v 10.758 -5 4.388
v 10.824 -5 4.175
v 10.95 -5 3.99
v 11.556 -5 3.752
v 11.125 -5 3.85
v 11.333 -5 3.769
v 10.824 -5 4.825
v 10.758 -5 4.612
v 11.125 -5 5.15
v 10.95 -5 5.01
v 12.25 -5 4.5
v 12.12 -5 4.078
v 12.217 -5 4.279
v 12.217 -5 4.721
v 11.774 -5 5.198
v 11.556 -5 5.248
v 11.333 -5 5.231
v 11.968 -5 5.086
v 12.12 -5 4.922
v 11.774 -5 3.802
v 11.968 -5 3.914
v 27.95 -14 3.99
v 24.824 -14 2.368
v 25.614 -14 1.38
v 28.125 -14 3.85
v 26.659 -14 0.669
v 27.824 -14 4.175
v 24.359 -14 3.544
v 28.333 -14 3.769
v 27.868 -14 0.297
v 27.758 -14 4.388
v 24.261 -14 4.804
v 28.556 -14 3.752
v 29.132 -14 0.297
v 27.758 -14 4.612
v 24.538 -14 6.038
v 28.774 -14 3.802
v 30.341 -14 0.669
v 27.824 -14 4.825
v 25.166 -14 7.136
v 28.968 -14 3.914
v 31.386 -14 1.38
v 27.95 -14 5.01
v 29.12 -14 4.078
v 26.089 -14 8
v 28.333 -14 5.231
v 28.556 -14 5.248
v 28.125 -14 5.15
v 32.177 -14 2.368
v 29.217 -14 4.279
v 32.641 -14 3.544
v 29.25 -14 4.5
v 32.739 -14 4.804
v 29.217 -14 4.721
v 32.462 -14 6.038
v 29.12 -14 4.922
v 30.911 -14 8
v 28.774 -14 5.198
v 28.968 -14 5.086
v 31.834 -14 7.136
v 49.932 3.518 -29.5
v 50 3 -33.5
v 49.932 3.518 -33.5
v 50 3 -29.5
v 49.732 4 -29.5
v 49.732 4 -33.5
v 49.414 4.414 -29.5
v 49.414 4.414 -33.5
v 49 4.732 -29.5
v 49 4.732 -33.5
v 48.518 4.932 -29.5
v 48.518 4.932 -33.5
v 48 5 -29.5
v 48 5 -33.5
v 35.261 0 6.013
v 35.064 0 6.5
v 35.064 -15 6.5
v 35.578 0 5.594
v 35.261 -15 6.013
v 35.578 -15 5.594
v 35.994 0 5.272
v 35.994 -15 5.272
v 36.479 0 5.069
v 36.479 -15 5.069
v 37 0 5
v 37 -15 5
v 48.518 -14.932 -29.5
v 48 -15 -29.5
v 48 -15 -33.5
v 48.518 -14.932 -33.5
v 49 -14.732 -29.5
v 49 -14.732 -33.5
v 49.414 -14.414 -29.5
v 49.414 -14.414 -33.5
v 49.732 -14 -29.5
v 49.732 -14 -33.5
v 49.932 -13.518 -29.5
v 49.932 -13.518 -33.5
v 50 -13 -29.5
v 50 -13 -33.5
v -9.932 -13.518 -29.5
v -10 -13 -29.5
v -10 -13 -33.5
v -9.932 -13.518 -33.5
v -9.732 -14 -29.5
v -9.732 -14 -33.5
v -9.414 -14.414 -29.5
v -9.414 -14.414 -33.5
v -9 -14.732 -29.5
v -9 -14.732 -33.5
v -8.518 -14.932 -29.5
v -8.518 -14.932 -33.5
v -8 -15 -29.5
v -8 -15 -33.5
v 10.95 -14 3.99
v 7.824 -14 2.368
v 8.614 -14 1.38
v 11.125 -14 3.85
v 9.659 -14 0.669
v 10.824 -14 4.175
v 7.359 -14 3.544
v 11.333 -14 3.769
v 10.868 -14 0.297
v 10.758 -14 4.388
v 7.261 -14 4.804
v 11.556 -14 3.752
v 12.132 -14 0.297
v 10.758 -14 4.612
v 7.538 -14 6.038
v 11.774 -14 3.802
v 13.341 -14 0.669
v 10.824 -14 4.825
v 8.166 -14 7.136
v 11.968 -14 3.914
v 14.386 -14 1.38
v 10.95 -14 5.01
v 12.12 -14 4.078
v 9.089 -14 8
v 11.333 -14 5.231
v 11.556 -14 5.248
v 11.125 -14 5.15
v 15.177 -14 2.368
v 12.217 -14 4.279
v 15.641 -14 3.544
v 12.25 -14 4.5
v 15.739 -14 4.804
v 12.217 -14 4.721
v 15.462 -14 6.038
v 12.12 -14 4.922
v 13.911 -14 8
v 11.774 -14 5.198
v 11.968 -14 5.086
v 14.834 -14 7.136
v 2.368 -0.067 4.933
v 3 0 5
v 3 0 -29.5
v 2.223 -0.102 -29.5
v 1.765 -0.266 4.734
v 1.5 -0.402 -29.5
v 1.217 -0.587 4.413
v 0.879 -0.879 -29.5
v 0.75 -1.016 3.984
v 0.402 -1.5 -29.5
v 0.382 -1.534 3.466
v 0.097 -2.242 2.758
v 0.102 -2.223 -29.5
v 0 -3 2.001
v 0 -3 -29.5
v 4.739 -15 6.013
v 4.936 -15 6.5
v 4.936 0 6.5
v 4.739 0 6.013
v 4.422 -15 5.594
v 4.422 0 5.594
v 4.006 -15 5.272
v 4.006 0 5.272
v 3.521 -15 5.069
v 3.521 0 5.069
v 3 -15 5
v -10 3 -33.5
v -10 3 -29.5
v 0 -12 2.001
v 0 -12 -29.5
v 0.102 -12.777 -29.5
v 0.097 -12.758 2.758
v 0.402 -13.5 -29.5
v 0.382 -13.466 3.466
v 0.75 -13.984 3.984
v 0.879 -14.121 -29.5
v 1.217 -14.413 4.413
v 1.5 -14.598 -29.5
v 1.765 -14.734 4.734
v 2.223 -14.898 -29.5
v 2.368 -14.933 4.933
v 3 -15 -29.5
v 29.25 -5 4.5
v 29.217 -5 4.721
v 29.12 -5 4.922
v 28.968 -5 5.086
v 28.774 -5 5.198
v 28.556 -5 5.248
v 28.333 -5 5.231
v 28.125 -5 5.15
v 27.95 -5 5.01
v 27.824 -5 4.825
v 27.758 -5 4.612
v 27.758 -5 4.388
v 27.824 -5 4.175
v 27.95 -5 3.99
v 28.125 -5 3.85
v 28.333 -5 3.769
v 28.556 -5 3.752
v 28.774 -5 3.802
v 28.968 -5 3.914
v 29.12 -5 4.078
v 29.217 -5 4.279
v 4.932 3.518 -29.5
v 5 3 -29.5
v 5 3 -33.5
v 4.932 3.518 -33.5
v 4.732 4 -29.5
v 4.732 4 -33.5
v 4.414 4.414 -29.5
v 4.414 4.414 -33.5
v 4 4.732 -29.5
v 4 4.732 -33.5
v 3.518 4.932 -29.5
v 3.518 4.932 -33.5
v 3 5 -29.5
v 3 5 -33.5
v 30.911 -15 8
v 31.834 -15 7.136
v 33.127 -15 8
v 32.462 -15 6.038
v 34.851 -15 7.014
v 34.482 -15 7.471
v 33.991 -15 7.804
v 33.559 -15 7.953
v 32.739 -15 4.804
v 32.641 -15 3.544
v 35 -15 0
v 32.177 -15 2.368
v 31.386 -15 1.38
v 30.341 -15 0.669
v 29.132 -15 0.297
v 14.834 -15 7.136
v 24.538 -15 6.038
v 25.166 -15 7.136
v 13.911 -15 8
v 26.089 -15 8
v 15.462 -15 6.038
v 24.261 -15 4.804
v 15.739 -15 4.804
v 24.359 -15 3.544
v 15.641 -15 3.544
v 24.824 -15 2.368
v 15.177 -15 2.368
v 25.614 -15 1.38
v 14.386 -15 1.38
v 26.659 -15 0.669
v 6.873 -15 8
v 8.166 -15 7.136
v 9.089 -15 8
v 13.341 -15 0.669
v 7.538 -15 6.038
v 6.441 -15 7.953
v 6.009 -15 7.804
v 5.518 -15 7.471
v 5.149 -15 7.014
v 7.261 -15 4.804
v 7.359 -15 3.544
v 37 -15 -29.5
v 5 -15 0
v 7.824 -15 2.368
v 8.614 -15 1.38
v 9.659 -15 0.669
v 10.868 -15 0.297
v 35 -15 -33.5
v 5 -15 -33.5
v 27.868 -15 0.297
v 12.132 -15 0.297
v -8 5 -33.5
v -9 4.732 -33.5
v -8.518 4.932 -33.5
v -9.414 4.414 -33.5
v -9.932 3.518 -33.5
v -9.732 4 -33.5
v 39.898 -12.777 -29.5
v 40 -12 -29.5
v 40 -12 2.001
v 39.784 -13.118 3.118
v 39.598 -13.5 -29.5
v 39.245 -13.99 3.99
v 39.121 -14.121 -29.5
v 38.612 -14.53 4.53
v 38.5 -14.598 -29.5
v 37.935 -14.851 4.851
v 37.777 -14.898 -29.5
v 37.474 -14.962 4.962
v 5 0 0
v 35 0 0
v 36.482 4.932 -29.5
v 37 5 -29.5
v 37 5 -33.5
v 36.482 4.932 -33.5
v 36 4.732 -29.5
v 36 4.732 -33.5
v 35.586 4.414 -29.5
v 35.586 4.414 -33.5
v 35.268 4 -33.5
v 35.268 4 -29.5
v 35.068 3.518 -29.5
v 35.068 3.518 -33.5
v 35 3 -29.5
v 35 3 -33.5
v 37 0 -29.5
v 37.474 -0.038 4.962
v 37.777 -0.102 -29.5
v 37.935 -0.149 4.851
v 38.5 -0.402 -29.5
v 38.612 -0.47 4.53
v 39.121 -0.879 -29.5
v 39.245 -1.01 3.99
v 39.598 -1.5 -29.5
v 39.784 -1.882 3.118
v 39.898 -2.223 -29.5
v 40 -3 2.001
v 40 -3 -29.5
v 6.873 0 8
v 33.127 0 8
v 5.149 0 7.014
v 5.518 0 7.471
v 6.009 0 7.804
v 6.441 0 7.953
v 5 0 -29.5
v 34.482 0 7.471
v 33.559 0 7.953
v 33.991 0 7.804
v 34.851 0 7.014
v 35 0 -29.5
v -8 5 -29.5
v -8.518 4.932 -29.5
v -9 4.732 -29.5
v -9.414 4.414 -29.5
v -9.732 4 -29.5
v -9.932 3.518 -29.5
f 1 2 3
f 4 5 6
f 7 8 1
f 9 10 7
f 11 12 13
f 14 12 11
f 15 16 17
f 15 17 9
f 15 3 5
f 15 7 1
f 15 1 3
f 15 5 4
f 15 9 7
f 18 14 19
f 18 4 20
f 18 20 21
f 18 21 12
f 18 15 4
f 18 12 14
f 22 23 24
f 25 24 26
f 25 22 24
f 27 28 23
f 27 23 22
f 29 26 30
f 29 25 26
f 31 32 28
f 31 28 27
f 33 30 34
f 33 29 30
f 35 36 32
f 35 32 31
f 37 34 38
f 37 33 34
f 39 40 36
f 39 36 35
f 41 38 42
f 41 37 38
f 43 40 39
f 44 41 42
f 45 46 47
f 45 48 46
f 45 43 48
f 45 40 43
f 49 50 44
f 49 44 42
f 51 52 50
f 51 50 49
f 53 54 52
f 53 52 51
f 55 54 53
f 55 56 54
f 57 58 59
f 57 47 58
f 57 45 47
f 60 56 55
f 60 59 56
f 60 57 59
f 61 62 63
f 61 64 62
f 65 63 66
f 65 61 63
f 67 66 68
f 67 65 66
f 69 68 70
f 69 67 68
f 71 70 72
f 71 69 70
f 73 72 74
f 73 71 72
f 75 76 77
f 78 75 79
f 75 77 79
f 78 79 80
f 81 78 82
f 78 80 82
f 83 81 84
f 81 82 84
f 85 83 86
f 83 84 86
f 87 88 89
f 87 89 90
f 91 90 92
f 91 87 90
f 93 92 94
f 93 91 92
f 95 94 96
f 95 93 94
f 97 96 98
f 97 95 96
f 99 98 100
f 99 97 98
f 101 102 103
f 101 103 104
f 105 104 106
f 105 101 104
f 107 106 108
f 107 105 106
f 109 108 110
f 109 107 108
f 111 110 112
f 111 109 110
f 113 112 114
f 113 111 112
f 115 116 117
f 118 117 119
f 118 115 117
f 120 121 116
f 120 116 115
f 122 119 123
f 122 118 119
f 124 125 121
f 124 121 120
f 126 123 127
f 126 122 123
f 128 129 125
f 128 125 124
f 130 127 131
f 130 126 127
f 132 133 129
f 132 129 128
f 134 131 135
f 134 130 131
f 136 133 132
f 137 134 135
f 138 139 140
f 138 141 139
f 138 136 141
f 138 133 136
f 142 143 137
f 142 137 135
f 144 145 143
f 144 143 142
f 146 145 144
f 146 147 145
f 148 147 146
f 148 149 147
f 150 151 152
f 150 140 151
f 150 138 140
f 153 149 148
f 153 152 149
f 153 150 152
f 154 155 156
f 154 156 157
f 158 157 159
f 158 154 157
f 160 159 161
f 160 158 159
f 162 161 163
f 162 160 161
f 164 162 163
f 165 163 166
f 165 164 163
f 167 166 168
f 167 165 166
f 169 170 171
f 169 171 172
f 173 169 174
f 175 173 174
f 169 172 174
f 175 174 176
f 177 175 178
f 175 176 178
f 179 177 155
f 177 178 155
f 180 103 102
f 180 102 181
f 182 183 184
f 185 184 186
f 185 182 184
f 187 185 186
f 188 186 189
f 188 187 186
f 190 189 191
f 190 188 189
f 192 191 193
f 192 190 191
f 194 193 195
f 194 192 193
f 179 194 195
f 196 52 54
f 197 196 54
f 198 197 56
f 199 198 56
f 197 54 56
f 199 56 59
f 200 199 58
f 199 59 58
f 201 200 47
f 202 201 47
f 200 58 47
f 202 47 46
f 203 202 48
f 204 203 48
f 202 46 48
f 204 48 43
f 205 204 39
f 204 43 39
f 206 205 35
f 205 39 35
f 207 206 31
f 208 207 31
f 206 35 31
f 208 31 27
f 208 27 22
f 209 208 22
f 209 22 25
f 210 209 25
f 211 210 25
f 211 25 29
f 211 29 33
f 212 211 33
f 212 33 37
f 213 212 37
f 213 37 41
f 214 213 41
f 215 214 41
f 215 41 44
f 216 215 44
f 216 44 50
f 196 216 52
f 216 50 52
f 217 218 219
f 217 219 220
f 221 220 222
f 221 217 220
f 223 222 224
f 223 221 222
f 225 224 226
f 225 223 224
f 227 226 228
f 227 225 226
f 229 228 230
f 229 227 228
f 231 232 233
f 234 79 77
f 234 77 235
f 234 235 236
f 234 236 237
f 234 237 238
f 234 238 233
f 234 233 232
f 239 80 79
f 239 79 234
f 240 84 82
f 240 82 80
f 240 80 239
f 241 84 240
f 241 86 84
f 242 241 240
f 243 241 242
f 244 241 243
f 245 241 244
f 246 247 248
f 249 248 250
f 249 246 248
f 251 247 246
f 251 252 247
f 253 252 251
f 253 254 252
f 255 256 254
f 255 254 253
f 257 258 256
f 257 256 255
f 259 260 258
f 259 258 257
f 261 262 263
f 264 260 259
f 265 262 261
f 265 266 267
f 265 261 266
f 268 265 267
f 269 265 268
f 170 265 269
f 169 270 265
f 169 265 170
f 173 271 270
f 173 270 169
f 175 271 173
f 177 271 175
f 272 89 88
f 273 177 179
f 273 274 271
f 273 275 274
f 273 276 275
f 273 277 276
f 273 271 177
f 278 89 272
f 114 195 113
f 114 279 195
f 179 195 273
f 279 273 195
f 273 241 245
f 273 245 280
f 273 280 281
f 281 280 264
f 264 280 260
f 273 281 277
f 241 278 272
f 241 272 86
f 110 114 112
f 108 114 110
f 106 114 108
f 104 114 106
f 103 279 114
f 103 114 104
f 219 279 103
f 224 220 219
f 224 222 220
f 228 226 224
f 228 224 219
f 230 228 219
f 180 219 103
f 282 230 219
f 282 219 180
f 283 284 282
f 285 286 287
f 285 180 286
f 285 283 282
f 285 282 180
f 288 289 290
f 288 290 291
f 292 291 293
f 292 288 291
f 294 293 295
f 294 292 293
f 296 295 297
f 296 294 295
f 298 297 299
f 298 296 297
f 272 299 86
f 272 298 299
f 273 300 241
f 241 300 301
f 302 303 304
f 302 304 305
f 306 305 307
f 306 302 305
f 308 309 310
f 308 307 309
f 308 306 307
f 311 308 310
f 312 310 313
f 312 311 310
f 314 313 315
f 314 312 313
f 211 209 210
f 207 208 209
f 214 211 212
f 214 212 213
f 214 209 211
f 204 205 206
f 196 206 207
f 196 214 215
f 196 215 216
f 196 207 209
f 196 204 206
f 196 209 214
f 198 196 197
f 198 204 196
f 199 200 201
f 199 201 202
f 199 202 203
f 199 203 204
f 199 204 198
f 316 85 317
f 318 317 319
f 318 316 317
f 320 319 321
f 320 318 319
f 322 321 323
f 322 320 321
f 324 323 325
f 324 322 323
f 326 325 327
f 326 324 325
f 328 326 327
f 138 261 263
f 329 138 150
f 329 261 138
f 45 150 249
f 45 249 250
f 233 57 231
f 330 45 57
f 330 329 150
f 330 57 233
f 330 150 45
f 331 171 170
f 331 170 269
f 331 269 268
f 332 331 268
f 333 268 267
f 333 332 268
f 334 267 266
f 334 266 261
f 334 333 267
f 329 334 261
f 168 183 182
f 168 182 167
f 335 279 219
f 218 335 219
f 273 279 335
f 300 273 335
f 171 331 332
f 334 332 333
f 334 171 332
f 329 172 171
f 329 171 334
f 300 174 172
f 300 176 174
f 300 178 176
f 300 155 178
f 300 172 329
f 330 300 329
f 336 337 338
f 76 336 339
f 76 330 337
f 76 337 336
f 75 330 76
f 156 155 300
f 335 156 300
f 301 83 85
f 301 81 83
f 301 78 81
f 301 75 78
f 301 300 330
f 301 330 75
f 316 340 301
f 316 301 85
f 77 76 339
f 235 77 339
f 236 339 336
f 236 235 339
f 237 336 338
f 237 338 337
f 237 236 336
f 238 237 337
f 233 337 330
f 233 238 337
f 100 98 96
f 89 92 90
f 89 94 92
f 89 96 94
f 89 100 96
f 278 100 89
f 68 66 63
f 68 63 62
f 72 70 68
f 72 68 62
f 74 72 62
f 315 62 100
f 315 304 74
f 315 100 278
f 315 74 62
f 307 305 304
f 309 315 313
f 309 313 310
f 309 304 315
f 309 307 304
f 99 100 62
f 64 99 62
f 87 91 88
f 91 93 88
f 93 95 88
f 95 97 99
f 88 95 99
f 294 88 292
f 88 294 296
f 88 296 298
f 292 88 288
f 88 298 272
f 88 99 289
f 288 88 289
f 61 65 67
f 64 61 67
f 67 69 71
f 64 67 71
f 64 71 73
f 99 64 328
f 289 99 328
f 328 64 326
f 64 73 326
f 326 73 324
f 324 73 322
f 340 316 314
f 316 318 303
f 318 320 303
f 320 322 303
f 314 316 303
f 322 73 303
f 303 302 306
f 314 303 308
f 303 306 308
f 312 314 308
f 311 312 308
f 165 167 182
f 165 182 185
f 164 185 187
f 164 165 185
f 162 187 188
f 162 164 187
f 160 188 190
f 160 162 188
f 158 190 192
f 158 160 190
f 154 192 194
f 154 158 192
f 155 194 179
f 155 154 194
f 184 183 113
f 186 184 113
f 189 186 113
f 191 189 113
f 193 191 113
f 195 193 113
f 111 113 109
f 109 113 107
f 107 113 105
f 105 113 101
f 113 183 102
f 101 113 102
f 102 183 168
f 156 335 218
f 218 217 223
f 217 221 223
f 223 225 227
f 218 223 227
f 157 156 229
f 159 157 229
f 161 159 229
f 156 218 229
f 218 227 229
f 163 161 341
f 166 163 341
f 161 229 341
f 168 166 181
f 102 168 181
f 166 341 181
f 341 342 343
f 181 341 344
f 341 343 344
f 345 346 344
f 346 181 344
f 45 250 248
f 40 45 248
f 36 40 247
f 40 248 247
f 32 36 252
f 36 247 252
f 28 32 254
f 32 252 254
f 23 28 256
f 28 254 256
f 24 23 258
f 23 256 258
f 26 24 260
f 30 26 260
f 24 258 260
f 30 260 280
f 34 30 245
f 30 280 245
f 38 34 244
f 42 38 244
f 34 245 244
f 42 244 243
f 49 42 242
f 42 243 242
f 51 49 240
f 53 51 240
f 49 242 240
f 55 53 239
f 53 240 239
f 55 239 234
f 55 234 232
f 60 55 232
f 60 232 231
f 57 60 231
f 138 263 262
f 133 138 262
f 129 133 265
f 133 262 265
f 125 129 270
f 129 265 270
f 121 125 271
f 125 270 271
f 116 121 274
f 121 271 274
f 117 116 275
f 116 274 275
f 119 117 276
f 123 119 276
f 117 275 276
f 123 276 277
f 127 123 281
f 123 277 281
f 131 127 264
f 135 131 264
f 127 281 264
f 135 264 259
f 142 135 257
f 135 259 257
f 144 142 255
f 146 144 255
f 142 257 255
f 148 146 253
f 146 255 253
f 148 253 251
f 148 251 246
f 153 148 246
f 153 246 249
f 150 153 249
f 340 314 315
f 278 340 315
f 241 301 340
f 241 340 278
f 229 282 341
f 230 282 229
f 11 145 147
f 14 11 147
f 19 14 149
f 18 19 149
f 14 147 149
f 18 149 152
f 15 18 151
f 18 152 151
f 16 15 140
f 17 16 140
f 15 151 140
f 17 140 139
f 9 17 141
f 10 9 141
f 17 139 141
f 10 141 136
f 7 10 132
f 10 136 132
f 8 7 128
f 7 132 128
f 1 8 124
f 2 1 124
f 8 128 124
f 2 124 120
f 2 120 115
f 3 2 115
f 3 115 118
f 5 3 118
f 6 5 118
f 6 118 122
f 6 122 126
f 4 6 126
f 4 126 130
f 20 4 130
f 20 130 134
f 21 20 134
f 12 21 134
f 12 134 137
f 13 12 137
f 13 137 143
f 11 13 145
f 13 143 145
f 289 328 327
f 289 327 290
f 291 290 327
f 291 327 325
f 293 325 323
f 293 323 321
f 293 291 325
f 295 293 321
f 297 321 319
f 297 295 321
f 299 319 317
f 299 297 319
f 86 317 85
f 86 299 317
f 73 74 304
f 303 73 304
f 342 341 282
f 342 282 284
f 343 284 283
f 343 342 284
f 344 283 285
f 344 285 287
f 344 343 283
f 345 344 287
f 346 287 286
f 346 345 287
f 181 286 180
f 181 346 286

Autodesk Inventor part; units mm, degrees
ref_plane "YZ Plane" through (0, 0, 0) normal (1, 0, 0) x (0, 1, 0)
ref_plane "XZ Plane" through (0, 0, 0) normal (0, 1, 0) x (-1, 0, 0)
ref_plane "XY Plane" through (0, 0, 0) normal (0, 0, 1) x (1, 0, 0)
sketch "Sketch1" plane through (0, 0, 0) normal (0, 0, 1) x (1, 0, 0)
  line L0 (0, 0) -> (40, 0)
  line L1 (40, 0) -> (40, -15)
  line L2 (40, -15) -> (0, -15)
  line L3 (0, -15) -> (0, 0)
  dimension "d0" = 40
  dimension "d1" = 15
extrude "Extrusion1" add sketch "Sketch1" along normal blind 5
sketch "Sketch2" plane through (0, 0, 5) normal (0, 0, 1) x (1, 0, 0)
  line L0 (40, 0) -> (0, 0) projected
  line L1 (5, 0) -> (35, 0)
  line L2 (35, 0) -> (35, -15)
  line L3 (35, -15) -> (5, -15)
  line L4 (5, -15) -> (5, 0)
  line L5 (0, 0) -> (0, -15) projected
  dimension "d4" = 30
  dimension "d5" = 15
  dimension "d6" = 5
extrude "Extrusion2" add sketch "Sketch2" along normal blind 3
fillet "Fillet1" radius 2 4 edges at (35, -7.5, 5) (35, -7.5, 8) (5, -7.5, 5) (5, -7.5, 8)
sketch "Sketch3" plane through (0, 0, 0) normal (0, 0, -1) x (-1, 0, 0)
  line L0 (0, 0) -> (0, -15) projected
  line L1 (-40, 0) -> (0, 0) projected
  line L2 (0, -15) -> (-5, -15)
  line L3 (-5, -15) -> (-5, 0)
  line L4 (-5, 0) -> (0, 0)
  line L5 (0, 0) -> (0, -15)
  line L6 (-40, -15) -> (-40, 0) projected
  line L7 (0, -15) -> (-40, -15) projected
  line L8 (-40, 0) -> (-35, 0)
  line L9 (-35, 0) -> (-35, -15)
  line L10 (-35, -15) -> (-40, -15)
  line L11 (-40, -15) -> (-40, 0)
  dimension "d10" = 5
  dimension "d11" = 5
extrude "Extrusion3" add sketch "Sketch3" along normal blind 33.5 contours L0 L2 L3 L1 | L9 L7 L6 L1
sketch "Sketch4" plane through (0, 0, -33.5) normal (0, 0, -1) x (-1, 0, 0)
  line L0 (-35, 0) -> (-35, -15) projected
  line L1 (-35, -15) -> (-50, -15)
  line L2 (-50, -15) -> (-50, 5)
  line L3 (-50, 5) -> (-35, 5)
  line L4 (-35, 5) -> (-35, -15)
  line L5 (-5, -15) -> (-35, -15) projected
  line L6 (-5, -15) -> (10, -15)
  line L7 (10, -15) -> (10, 5)
  line L8 (10, 5) -> (-5, 5)
  line L9 (-5, 5) -> (-5, -15)
  point P0 (-4.9365, 0)
  dimension "d18" = 15
  dimension "d19" = 20
  dimension "d20" = 15
extrude "Extrusion4" add sketch "Sketch4" against normal blind 4
fillet "Fillet2" radius 3 6 edges at (0, 0, -12.25) (0, -7.5, 5) (0, -15, -12.25) (40, -15, -12.25) (40, -7.5, 5) (40, 0, -12.25)
fillet "Fillet3" radius 2 6 edges at (-10, 5, -31.5) (5, 5, -31.5) (-10, -15, -31.5) (35, 5, -31.5) (50, 5, -31.5) (50, -15, -31.5)
sketch "Sketch5" plane through (6.873, -15, 8) normal (0, -1, 0) x (1, 0, 0)
  arc A0 (2.2162, 0) -> (7.038, 0) centre (4.6271, -3.5) ccw
  arc A1 (19.2162, 0) -> (24.038, 0) centre (21.6271, -3.5) ccw
  line L0 (-1.8729, -41.5) -> (-14.8729, -41.5)
  line L1 (-14.8729, -37.5) -> (-3.8729, -37.5)
  line L2 (-16.8729, -37.5) -> (-16.8729, -41.5)
  line L3 (-6.8729, -6) -> (-6.8729, -37.5)
  arc A2 (0.0001, 0) -> (-1.9364, -1.5) centre (0.0001, -2) ccw
  arc A3 (-3.8729, -3) -> (-1.9364, -1.5) centre (-3.8729, -1) ccw
  arc A4 (-3.8729, -3) -> (-6.8729, -6) centre (-3.8729, -6) ccw
  line L4 (0, 0) -> (26.254, 0) projected
  point P0 (-6.873, -8)
  point P1 (-1.8729, -43)
extrude "Extrusion5" cut sketch "Sketch5" against normal blind 1
sketch "Sketch6" plane through (5, -15, 0) normal (0, -1, 0) x (1, 0, 0)
  arc A0 (21.0892, 8) -> (25.911, 8) centre (23.5001, 4.5) ccw projected
  circle A1 centre (23.5001, 4.5) radius 0.75
  arc A2 (4.0892, 8) -> (8.911, 8) centre (6.5001, 4.5) ccw projected
  circle A3 centre (6.5001, 4.5) radius 0.75
  point P0 (-5, 0)
  dimension "d27" = 1.5
  dimension "d28" = 1.5
extrude "Extrusion6" cut sketch "Sketch6" against normal blind 10
properties part number "podstawa 01-3"
